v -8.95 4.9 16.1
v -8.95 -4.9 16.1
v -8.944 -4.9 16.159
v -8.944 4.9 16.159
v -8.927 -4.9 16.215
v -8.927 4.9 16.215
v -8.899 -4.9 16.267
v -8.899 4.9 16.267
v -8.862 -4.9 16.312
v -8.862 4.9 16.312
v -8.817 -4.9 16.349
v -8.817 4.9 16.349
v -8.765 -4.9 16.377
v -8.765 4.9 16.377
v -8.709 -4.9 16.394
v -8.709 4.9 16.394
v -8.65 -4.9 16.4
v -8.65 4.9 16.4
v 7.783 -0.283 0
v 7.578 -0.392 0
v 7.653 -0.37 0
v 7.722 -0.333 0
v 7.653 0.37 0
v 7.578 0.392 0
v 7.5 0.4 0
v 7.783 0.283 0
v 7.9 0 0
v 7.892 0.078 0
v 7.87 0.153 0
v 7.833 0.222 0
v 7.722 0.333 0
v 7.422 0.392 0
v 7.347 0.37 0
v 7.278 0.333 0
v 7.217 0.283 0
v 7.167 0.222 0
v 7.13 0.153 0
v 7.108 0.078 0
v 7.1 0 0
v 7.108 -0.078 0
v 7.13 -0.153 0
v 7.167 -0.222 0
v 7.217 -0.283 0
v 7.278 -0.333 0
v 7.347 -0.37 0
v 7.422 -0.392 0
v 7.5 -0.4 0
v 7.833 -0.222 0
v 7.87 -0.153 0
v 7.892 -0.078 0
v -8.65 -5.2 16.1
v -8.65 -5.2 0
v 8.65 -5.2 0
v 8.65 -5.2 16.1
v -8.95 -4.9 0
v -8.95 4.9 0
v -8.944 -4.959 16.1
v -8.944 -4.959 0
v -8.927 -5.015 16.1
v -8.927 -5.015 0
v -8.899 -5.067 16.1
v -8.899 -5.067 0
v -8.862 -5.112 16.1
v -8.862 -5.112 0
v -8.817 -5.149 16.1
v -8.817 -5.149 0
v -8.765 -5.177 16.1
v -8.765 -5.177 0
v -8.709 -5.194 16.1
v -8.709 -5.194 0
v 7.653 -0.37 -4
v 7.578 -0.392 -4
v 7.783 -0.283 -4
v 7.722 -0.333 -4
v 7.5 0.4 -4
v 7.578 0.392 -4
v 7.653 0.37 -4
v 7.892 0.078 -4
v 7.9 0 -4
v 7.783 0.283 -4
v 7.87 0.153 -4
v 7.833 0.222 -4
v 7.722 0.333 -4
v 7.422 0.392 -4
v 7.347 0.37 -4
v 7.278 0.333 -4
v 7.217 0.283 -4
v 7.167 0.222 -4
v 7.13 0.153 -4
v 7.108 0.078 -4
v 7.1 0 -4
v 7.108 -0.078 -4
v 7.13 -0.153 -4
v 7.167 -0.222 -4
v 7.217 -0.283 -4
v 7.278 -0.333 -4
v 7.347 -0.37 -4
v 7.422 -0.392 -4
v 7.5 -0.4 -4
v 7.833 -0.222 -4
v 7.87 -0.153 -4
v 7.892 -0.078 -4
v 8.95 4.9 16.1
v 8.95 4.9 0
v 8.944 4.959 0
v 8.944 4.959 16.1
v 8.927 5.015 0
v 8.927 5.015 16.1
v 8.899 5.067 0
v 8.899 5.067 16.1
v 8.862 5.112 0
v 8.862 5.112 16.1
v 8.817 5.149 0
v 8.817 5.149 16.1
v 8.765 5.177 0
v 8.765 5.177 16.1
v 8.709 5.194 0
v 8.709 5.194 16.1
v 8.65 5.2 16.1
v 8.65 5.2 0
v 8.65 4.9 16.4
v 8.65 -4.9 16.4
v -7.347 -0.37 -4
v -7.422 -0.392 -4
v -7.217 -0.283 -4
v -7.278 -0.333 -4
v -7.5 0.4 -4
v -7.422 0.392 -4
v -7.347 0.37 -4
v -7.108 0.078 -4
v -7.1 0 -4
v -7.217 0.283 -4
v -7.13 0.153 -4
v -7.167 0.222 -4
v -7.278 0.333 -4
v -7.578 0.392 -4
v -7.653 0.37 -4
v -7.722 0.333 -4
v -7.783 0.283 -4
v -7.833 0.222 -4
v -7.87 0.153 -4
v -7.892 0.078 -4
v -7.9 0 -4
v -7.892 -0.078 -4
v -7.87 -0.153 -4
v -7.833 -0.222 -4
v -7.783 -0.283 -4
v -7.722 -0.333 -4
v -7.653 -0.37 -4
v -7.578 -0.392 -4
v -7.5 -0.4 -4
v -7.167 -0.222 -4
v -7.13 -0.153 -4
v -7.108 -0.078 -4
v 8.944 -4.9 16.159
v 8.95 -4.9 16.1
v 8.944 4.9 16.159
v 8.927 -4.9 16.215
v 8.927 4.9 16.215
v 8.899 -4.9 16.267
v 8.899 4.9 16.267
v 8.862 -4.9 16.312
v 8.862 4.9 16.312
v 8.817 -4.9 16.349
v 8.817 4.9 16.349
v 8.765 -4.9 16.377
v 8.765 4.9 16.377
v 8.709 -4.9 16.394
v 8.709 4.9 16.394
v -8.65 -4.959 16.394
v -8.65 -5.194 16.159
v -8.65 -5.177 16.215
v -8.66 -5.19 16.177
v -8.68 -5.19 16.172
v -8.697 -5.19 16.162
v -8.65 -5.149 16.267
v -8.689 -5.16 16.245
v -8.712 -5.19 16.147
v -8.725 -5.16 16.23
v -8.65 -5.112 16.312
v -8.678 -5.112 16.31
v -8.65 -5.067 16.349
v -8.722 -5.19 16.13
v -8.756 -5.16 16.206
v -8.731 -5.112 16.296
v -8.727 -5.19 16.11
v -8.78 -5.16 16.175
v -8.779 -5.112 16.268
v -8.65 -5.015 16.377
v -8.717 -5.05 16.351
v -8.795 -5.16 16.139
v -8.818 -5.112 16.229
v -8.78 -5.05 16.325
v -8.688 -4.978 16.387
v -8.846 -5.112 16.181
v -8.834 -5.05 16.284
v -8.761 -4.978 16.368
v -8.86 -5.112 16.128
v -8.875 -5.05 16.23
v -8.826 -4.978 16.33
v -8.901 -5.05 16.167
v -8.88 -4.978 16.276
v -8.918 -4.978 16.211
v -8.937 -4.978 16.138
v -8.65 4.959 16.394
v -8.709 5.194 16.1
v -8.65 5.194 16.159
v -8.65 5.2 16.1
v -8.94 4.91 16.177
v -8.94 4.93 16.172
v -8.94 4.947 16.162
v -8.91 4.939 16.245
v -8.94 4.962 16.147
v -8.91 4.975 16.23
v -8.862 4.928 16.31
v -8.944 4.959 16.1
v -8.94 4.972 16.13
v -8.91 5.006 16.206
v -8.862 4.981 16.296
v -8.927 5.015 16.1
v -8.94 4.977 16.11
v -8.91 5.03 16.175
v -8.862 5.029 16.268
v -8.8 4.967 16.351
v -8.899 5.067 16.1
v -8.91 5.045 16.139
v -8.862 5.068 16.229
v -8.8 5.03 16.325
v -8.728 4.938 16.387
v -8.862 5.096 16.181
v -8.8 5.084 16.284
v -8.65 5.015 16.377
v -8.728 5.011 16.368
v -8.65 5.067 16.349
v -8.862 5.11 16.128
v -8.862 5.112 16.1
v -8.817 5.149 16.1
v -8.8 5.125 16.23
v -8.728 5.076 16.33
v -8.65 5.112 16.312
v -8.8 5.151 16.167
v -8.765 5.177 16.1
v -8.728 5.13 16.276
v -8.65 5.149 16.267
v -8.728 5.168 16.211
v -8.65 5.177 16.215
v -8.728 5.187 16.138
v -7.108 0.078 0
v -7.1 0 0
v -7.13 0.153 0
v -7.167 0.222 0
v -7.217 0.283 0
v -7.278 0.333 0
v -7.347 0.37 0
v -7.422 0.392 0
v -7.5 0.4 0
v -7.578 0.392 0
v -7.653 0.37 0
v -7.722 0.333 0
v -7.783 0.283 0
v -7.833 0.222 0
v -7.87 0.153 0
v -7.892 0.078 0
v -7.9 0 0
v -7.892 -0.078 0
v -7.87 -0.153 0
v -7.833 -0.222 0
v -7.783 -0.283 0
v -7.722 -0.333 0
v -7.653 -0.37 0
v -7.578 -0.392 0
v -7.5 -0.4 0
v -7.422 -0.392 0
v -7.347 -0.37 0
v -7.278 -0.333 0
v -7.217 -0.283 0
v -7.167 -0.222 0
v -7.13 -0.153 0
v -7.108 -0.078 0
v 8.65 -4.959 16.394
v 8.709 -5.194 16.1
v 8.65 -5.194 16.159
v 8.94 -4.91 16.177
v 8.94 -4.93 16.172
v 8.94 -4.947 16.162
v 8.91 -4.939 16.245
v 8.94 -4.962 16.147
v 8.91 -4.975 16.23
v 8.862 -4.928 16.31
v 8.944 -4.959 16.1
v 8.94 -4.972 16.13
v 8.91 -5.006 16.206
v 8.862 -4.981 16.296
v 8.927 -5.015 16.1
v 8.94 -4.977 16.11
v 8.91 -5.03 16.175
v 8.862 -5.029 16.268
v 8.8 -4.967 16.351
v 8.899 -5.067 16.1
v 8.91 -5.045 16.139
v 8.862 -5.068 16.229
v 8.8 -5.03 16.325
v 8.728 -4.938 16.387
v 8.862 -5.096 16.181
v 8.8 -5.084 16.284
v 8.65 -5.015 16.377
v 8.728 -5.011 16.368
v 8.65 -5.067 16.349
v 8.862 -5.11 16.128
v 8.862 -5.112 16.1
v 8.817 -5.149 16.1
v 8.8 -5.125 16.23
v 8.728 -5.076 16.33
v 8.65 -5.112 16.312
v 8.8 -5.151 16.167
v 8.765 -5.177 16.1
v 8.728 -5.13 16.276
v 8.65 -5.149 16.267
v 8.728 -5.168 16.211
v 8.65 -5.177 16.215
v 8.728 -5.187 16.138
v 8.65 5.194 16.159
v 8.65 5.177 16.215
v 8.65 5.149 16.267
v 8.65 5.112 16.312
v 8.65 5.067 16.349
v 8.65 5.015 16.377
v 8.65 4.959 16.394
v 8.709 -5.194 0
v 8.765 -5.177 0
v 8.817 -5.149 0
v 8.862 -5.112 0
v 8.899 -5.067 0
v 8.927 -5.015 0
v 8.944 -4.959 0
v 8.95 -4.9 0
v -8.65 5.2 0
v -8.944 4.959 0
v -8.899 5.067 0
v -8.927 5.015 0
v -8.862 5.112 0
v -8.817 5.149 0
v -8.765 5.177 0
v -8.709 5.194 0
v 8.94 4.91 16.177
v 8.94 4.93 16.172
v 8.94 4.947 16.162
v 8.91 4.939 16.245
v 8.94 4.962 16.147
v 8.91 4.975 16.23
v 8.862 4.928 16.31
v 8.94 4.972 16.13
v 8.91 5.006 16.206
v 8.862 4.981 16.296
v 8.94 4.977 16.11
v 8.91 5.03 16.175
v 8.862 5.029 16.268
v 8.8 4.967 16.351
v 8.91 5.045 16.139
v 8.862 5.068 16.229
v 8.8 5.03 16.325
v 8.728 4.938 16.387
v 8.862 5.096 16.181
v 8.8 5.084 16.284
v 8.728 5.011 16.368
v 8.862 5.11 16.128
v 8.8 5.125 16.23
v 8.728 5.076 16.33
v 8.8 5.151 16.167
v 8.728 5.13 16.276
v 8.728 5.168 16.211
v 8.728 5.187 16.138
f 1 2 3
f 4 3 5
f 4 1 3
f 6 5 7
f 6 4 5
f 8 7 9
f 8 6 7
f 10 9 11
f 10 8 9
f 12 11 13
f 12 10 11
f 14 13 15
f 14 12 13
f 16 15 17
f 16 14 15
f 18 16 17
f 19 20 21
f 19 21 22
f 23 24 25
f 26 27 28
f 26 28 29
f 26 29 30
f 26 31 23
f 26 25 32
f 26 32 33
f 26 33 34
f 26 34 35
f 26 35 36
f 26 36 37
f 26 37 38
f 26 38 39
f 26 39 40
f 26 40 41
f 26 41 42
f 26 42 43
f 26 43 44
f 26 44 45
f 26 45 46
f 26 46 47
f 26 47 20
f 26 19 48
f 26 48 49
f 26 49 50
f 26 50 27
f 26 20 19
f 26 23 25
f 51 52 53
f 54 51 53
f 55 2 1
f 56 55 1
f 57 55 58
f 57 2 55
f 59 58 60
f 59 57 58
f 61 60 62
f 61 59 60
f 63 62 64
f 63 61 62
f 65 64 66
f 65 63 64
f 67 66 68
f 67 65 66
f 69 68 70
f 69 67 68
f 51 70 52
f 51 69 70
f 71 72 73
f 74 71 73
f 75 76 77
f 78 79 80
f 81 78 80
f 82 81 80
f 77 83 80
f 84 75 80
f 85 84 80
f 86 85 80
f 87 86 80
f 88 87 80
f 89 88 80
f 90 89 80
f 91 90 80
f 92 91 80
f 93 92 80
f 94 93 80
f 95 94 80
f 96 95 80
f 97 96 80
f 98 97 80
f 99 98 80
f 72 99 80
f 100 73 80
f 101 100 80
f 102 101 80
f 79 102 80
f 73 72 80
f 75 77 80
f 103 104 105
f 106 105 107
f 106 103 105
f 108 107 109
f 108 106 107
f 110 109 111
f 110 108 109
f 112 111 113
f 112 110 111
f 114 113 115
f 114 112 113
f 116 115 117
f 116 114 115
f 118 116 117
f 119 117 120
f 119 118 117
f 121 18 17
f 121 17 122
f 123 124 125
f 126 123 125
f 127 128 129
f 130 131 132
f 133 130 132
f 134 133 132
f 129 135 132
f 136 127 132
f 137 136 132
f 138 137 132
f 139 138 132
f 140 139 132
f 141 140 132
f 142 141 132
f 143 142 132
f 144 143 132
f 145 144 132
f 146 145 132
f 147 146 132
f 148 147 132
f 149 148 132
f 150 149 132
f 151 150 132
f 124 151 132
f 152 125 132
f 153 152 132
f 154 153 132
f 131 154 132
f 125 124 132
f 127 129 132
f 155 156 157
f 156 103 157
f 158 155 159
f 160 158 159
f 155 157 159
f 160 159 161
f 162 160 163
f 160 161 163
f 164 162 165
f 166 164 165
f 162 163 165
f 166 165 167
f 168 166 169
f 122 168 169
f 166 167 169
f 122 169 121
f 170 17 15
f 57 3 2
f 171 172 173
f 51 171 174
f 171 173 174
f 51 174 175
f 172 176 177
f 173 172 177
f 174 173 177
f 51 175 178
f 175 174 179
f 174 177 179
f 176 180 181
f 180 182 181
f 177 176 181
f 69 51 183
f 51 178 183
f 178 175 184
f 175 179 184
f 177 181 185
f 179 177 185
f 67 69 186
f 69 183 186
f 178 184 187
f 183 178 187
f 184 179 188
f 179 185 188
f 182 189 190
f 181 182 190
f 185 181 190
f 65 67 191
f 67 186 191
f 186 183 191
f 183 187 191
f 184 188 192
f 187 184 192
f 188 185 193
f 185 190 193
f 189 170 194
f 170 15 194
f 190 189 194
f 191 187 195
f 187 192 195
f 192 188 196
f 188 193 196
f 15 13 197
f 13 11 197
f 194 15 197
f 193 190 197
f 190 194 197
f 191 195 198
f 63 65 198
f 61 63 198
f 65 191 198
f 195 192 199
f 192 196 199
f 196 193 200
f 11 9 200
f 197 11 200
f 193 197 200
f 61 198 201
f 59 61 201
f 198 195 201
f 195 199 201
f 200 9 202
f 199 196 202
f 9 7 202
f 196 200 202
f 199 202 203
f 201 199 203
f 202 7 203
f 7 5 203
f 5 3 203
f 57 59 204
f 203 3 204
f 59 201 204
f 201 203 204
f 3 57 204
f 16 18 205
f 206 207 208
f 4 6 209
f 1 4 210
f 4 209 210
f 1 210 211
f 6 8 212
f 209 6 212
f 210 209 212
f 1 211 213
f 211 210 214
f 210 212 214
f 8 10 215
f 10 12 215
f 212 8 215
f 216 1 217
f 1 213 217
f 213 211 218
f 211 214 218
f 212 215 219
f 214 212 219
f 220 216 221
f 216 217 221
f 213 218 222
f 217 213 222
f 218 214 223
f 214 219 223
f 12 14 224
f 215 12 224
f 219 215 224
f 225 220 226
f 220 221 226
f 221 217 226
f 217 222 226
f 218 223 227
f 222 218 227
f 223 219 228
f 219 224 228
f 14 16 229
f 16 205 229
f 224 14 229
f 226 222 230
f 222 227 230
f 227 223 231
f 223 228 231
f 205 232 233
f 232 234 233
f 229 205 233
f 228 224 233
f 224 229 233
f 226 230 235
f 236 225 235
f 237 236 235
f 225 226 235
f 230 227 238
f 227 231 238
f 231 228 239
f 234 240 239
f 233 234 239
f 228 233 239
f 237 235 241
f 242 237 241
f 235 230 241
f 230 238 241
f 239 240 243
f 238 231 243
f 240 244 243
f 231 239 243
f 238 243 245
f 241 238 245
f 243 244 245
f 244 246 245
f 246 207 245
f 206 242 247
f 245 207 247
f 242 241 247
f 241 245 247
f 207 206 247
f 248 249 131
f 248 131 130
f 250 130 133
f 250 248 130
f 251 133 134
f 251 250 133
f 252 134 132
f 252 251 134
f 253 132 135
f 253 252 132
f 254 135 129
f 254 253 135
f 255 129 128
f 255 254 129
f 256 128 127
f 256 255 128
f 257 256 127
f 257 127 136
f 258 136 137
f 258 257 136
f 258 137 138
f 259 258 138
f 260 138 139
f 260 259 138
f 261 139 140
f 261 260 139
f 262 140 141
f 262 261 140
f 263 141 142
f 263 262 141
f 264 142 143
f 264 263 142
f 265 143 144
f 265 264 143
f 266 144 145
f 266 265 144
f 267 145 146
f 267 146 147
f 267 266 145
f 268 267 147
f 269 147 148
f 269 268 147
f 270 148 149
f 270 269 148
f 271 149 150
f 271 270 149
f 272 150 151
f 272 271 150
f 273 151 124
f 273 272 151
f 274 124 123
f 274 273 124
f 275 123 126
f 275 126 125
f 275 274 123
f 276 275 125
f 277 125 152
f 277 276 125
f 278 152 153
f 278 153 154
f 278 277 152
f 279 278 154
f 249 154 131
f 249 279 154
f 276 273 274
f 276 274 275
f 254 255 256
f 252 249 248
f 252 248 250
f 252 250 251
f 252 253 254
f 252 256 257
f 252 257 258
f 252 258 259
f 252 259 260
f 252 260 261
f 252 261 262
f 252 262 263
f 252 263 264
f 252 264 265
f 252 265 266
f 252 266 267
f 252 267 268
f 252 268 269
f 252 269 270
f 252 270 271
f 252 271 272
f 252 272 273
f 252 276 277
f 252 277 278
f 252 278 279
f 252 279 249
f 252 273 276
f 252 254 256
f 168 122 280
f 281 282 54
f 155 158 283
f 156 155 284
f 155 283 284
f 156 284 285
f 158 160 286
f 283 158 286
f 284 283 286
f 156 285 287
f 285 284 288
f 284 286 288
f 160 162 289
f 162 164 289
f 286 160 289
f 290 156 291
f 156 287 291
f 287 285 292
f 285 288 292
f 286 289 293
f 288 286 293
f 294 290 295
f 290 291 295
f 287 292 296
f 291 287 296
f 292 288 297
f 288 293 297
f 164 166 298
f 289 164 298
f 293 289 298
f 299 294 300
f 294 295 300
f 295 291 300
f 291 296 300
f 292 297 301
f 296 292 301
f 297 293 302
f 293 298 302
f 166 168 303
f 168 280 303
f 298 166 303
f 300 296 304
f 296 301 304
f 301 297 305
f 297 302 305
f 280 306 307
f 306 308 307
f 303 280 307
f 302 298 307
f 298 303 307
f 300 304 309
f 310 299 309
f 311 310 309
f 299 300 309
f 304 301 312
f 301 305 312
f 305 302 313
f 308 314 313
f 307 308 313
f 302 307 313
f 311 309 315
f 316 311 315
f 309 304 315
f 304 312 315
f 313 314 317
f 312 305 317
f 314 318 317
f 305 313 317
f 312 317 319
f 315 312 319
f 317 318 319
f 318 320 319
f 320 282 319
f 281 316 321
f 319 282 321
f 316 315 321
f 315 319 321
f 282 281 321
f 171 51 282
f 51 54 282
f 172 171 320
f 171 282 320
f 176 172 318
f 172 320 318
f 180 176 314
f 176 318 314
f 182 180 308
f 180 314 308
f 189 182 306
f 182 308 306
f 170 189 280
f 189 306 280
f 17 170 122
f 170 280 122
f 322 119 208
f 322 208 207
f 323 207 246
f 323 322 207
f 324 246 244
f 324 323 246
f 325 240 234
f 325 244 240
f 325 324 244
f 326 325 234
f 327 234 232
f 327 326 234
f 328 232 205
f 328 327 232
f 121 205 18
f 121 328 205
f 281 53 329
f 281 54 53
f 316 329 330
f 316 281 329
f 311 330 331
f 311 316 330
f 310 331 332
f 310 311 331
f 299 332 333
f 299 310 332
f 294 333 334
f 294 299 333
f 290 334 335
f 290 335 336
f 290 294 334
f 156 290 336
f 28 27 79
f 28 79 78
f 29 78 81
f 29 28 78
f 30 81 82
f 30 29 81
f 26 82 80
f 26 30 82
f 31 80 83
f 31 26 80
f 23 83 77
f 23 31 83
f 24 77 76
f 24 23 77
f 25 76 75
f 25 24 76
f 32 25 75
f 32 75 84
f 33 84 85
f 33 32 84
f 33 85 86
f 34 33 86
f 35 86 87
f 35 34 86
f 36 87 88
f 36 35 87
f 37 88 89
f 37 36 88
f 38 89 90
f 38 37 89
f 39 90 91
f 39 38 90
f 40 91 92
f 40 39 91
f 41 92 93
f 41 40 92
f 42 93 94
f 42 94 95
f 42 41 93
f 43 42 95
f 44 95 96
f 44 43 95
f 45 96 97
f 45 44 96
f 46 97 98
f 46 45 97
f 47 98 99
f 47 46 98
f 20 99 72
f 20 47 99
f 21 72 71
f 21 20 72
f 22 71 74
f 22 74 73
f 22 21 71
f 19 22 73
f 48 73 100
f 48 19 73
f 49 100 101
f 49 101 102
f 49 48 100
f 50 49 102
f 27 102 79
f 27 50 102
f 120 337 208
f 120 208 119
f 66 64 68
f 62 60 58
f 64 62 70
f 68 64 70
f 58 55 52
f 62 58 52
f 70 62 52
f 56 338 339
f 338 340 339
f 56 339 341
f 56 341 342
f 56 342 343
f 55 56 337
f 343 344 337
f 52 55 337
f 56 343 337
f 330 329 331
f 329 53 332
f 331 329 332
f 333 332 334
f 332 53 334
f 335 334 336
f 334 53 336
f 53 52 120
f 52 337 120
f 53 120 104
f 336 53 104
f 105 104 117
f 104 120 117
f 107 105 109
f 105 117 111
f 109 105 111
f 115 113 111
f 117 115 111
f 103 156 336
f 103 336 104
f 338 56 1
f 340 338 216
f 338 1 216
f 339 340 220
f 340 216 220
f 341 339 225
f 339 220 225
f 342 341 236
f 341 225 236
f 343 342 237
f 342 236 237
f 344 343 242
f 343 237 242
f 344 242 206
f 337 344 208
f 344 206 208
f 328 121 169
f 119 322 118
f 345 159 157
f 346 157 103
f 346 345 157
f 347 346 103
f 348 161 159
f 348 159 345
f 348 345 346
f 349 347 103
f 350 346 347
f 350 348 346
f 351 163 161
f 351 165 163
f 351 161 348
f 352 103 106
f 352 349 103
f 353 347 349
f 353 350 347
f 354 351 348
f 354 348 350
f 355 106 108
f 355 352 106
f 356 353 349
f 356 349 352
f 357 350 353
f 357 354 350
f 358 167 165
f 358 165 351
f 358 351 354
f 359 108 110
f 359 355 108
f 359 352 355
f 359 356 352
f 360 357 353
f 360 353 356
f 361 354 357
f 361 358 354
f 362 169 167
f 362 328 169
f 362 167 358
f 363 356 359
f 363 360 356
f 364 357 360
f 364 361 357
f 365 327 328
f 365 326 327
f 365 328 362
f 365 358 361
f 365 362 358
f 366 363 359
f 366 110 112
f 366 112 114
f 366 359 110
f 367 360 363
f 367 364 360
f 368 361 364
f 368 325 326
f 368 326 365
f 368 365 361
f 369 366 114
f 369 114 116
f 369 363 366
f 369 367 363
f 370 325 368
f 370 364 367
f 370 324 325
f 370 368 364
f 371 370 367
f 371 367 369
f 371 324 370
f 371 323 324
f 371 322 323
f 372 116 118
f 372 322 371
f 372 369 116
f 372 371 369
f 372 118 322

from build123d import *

# Parameters (mm, degrees)
F0_W     = 17.9
F0_H     = 10.4
F1_DEPTH = 16.4
F2_R     = 0.3
F3_R     = 0.4
F4_DEPTH = 4


with BuildPart() as f1:
    # F0 (on Top) → F1 (new body)
    with BuildSketch(Plane.XY):
        Rectangle(F0_W, F0_H)
    extrude(amount=F1_DEPTH)

    # F2
    f2_edges = [f1.edges().sort_by_distance(p)[0] for p in [
        (0, 5.2, 16.4),
        (-8.95, 0, 16.4),
        (0, -5.2, 16.4),
        (8.95, 0, 16.4),
        (8.95, -5.2, 8.2),
        (8.95, 5.2, 8.2),
        (-8.95, 5.2, 8.2),
        (-8.95, -5.2, 8.2),
    ]]
    fillet(f2_edges, radius=F2_R)


with BuildPart() as f4:
    # F3 (on Top) → F4 (new body)
    with BuildSketch(Plane.XY):
        with Locations((-7.5, 0)):
            Circle(F3_R)
        with Locations((7.5, 0)):
            Circle(F3_R)
    extrude(amount=-F4_DEPTH)


solid = Compound([f1.part, f4.part])
